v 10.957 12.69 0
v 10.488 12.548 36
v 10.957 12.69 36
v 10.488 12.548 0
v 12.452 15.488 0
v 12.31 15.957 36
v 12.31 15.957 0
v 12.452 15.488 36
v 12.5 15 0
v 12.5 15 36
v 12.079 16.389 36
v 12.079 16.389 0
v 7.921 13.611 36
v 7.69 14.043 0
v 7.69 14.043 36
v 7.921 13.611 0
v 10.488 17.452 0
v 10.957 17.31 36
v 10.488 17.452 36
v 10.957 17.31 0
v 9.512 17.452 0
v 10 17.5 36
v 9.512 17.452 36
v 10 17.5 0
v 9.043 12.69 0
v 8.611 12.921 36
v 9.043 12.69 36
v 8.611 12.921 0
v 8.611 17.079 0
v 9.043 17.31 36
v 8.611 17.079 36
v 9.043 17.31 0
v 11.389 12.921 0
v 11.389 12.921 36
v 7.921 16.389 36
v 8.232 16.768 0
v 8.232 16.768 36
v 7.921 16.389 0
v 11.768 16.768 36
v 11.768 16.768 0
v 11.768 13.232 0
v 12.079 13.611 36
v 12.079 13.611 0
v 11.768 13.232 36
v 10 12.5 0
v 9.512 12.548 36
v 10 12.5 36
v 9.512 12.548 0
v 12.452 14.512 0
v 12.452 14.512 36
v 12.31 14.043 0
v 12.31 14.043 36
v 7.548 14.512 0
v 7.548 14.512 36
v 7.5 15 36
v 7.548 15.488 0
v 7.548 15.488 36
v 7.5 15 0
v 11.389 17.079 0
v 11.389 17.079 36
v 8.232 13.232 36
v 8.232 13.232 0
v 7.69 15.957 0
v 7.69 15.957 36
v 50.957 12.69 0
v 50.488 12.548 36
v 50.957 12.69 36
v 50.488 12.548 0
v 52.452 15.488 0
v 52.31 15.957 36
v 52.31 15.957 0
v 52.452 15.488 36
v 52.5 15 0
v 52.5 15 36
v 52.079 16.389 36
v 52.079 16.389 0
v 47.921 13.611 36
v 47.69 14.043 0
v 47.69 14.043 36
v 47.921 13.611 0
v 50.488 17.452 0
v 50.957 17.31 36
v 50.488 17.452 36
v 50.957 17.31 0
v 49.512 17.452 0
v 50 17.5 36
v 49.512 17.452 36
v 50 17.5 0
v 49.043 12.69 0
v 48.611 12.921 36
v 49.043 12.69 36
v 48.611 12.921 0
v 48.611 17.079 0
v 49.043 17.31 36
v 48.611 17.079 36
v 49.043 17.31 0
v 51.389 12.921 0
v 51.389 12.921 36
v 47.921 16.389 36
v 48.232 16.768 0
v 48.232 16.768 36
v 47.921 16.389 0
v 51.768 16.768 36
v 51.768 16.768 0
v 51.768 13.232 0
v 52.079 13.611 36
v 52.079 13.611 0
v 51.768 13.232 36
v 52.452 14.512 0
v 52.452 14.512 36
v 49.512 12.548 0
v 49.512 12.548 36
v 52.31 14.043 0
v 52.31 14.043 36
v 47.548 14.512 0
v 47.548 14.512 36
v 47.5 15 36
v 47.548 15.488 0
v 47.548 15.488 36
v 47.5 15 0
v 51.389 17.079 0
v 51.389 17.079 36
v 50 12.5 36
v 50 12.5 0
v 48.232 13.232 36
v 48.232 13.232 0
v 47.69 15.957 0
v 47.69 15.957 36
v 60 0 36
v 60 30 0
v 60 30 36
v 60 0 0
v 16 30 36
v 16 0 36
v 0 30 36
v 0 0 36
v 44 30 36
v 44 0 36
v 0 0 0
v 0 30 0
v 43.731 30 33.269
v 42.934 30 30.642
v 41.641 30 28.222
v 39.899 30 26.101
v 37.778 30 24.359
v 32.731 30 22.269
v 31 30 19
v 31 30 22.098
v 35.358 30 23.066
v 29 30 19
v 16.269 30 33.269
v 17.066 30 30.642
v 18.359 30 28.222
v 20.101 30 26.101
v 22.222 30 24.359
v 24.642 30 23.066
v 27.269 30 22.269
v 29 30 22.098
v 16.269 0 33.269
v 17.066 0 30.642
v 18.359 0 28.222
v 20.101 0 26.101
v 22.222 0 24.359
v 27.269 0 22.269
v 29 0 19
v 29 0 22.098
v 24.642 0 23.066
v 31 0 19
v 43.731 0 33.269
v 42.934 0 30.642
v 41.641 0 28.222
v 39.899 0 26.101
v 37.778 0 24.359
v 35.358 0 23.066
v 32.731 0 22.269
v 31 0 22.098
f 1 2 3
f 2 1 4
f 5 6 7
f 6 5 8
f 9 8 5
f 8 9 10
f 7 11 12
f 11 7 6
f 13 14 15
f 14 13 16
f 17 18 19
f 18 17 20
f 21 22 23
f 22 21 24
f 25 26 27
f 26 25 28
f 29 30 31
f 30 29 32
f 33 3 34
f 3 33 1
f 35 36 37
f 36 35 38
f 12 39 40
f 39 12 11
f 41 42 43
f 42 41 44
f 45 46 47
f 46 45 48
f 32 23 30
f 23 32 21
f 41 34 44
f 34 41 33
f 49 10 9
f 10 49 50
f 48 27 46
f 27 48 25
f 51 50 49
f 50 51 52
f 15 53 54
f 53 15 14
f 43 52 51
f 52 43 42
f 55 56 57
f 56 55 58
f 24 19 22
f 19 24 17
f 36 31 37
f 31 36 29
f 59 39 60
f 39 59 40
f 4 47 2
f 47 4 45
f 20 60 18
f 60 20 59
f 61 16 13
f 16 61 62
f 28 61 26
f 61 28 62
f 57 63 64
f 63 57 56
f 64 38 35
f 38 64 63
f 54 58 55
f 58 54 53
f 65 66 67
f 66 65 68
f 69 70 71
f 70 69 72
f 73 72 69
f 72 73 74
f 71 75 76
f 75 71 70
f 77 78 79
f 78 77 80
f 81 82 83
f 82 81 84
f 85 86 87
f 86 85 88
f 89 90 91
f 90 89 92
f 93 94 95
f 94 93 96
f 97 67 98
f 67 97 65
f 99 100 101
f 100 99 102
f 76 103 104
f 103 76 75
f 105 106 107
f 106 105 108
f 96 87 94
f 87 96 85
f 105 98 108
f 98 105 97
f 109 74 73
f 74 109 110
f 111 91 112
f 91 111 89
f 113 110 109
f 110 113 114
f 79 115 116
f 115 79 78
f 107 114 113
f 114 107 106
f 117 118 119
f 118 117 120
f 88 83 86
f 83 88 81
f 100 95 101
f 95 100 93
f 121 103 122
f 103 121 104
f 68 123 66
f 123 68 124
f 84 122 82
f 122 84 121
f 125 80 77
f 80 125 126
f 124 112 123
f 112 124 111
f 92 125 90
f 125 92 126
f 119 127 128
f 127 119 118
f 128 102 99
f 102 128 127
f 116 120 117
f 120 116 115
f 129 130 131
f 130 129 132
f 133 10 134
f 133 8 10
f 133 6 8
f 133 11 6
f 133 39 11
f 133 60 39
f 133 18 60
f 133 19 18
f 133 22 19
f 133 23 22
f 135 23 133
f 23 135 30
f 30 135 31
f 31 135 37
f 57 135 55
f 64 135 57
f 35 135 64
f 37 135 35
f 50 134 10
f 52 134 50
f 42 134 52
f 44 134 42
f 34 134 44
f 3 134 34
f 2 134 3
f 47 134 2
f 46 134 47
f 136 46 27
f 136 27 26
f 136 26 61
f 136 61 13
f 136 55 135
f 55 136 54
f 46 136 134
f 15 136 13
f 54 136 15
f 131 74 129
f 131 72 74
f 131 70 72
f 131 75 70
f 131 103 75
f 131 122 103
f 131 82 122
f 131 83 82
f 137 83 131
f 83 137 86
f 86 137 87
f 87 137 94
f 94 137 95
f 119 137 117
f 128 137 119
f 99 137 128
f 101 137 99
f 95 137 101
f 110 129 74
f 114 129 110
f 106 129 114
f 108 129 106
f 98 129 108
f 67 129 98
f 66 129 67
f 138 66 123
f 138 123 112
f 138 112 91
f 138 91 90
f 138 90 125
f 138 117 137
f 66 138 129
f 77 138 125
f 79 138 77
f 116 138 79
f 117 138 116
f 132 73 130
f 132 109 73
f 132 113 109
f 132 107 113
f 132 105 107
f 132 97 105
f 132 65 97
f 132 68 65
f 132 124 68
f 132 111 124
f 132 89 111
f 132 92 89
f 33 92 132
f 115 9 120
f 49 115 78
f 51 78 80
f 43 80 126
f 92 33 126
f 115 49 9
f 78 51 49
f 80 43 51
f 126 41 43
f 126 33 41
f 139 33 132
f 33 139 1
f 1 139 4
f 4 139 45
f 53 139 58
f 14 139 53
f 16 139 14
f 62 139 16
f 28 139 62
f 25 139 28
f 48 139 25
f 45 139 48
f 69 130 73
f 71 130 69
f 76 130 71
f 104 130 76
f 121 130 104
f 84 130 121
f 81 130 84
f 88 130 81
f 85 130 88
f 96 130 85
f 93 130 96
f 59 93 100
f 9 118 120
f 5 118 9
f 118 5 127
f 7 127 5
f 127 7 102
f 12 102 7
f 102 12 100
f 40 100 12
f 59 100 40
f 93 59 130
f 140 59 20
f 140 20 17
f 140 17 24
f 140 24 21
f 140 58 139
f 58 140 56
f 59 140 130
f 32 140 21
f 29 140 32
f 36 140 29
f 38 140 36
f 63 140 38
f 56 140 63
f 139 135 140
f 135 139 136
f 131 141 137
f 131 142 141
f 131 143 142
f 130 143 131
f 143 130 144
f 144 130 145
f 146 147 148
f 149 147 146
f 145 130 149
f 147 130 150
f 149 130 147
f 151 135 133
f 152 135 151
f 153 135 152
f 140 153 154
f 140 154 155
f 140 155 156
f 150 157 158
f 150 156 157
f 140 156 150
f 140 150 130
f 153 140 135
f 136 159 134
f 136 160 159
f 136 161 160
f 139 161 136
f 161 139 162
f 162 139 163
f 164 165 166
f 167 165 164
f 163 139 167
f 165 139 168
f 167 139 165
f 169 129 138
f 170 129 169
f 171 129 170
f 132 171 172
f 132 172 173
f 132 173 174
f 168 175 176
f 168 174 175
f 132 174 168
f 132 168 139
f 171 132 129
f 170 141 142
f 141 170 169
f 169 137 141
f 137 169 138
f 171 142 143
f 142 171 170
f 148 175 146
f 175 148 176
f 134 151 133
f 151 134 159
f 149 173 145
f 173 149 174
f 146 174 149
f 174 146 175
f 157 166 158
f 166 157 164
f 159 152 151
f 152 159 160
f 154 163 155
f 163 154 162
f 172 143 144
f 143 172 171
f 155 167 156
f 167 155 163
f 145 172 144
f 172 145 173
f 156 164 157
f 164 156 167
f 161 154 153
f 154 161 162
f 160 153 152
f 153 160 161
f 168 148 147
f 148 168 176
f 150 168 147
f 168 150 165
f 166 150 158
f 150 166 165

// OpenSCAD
$fn = 32;

// ----------------------------------------------------------------------
// Saddle clamp: split shaft clamp
// ----------------------------------------------------------------------

// --- parameters (mm) ---
blk_l = 60;               // block length, X
blk_w = 30;               // block width, Y
blk_h = 36;               // block height
clamp_r = 14;             // shaft groove radius
hole_r = 2.5;             // bolt hole radius
hole_m = 10;              // bolt hole margin from the ends
saw_w = 2;                // saw kerf width
fit_tol = 0.05;           // tolerance for press fits, mm
free_tol = 0.2;           // tolerance for clearance fits, mm

saw_depth = clamp_r + 3;  // saw kerf depth

difference() {
  cube([blk_l, blk_w, blk_h]);
  translate([blk_l / 2, -1, blk_h])
    rotate([-90, 0, 0])
      cylinder(h = blk_w + 2, r = clamp_r);
  for (sx = [0, 1])
    translate([sx ? blk_l - hole_m : hole_m, blk_w / 2, -1])
      cylinder(r = hole_r, h = blk_h + 2);
  translate([blk_l / 2 - saw_w / 2, -1, blk_h - saw_depth])
    cube([saw_w, blk_w + 2, saw_depth + 1]);
}
